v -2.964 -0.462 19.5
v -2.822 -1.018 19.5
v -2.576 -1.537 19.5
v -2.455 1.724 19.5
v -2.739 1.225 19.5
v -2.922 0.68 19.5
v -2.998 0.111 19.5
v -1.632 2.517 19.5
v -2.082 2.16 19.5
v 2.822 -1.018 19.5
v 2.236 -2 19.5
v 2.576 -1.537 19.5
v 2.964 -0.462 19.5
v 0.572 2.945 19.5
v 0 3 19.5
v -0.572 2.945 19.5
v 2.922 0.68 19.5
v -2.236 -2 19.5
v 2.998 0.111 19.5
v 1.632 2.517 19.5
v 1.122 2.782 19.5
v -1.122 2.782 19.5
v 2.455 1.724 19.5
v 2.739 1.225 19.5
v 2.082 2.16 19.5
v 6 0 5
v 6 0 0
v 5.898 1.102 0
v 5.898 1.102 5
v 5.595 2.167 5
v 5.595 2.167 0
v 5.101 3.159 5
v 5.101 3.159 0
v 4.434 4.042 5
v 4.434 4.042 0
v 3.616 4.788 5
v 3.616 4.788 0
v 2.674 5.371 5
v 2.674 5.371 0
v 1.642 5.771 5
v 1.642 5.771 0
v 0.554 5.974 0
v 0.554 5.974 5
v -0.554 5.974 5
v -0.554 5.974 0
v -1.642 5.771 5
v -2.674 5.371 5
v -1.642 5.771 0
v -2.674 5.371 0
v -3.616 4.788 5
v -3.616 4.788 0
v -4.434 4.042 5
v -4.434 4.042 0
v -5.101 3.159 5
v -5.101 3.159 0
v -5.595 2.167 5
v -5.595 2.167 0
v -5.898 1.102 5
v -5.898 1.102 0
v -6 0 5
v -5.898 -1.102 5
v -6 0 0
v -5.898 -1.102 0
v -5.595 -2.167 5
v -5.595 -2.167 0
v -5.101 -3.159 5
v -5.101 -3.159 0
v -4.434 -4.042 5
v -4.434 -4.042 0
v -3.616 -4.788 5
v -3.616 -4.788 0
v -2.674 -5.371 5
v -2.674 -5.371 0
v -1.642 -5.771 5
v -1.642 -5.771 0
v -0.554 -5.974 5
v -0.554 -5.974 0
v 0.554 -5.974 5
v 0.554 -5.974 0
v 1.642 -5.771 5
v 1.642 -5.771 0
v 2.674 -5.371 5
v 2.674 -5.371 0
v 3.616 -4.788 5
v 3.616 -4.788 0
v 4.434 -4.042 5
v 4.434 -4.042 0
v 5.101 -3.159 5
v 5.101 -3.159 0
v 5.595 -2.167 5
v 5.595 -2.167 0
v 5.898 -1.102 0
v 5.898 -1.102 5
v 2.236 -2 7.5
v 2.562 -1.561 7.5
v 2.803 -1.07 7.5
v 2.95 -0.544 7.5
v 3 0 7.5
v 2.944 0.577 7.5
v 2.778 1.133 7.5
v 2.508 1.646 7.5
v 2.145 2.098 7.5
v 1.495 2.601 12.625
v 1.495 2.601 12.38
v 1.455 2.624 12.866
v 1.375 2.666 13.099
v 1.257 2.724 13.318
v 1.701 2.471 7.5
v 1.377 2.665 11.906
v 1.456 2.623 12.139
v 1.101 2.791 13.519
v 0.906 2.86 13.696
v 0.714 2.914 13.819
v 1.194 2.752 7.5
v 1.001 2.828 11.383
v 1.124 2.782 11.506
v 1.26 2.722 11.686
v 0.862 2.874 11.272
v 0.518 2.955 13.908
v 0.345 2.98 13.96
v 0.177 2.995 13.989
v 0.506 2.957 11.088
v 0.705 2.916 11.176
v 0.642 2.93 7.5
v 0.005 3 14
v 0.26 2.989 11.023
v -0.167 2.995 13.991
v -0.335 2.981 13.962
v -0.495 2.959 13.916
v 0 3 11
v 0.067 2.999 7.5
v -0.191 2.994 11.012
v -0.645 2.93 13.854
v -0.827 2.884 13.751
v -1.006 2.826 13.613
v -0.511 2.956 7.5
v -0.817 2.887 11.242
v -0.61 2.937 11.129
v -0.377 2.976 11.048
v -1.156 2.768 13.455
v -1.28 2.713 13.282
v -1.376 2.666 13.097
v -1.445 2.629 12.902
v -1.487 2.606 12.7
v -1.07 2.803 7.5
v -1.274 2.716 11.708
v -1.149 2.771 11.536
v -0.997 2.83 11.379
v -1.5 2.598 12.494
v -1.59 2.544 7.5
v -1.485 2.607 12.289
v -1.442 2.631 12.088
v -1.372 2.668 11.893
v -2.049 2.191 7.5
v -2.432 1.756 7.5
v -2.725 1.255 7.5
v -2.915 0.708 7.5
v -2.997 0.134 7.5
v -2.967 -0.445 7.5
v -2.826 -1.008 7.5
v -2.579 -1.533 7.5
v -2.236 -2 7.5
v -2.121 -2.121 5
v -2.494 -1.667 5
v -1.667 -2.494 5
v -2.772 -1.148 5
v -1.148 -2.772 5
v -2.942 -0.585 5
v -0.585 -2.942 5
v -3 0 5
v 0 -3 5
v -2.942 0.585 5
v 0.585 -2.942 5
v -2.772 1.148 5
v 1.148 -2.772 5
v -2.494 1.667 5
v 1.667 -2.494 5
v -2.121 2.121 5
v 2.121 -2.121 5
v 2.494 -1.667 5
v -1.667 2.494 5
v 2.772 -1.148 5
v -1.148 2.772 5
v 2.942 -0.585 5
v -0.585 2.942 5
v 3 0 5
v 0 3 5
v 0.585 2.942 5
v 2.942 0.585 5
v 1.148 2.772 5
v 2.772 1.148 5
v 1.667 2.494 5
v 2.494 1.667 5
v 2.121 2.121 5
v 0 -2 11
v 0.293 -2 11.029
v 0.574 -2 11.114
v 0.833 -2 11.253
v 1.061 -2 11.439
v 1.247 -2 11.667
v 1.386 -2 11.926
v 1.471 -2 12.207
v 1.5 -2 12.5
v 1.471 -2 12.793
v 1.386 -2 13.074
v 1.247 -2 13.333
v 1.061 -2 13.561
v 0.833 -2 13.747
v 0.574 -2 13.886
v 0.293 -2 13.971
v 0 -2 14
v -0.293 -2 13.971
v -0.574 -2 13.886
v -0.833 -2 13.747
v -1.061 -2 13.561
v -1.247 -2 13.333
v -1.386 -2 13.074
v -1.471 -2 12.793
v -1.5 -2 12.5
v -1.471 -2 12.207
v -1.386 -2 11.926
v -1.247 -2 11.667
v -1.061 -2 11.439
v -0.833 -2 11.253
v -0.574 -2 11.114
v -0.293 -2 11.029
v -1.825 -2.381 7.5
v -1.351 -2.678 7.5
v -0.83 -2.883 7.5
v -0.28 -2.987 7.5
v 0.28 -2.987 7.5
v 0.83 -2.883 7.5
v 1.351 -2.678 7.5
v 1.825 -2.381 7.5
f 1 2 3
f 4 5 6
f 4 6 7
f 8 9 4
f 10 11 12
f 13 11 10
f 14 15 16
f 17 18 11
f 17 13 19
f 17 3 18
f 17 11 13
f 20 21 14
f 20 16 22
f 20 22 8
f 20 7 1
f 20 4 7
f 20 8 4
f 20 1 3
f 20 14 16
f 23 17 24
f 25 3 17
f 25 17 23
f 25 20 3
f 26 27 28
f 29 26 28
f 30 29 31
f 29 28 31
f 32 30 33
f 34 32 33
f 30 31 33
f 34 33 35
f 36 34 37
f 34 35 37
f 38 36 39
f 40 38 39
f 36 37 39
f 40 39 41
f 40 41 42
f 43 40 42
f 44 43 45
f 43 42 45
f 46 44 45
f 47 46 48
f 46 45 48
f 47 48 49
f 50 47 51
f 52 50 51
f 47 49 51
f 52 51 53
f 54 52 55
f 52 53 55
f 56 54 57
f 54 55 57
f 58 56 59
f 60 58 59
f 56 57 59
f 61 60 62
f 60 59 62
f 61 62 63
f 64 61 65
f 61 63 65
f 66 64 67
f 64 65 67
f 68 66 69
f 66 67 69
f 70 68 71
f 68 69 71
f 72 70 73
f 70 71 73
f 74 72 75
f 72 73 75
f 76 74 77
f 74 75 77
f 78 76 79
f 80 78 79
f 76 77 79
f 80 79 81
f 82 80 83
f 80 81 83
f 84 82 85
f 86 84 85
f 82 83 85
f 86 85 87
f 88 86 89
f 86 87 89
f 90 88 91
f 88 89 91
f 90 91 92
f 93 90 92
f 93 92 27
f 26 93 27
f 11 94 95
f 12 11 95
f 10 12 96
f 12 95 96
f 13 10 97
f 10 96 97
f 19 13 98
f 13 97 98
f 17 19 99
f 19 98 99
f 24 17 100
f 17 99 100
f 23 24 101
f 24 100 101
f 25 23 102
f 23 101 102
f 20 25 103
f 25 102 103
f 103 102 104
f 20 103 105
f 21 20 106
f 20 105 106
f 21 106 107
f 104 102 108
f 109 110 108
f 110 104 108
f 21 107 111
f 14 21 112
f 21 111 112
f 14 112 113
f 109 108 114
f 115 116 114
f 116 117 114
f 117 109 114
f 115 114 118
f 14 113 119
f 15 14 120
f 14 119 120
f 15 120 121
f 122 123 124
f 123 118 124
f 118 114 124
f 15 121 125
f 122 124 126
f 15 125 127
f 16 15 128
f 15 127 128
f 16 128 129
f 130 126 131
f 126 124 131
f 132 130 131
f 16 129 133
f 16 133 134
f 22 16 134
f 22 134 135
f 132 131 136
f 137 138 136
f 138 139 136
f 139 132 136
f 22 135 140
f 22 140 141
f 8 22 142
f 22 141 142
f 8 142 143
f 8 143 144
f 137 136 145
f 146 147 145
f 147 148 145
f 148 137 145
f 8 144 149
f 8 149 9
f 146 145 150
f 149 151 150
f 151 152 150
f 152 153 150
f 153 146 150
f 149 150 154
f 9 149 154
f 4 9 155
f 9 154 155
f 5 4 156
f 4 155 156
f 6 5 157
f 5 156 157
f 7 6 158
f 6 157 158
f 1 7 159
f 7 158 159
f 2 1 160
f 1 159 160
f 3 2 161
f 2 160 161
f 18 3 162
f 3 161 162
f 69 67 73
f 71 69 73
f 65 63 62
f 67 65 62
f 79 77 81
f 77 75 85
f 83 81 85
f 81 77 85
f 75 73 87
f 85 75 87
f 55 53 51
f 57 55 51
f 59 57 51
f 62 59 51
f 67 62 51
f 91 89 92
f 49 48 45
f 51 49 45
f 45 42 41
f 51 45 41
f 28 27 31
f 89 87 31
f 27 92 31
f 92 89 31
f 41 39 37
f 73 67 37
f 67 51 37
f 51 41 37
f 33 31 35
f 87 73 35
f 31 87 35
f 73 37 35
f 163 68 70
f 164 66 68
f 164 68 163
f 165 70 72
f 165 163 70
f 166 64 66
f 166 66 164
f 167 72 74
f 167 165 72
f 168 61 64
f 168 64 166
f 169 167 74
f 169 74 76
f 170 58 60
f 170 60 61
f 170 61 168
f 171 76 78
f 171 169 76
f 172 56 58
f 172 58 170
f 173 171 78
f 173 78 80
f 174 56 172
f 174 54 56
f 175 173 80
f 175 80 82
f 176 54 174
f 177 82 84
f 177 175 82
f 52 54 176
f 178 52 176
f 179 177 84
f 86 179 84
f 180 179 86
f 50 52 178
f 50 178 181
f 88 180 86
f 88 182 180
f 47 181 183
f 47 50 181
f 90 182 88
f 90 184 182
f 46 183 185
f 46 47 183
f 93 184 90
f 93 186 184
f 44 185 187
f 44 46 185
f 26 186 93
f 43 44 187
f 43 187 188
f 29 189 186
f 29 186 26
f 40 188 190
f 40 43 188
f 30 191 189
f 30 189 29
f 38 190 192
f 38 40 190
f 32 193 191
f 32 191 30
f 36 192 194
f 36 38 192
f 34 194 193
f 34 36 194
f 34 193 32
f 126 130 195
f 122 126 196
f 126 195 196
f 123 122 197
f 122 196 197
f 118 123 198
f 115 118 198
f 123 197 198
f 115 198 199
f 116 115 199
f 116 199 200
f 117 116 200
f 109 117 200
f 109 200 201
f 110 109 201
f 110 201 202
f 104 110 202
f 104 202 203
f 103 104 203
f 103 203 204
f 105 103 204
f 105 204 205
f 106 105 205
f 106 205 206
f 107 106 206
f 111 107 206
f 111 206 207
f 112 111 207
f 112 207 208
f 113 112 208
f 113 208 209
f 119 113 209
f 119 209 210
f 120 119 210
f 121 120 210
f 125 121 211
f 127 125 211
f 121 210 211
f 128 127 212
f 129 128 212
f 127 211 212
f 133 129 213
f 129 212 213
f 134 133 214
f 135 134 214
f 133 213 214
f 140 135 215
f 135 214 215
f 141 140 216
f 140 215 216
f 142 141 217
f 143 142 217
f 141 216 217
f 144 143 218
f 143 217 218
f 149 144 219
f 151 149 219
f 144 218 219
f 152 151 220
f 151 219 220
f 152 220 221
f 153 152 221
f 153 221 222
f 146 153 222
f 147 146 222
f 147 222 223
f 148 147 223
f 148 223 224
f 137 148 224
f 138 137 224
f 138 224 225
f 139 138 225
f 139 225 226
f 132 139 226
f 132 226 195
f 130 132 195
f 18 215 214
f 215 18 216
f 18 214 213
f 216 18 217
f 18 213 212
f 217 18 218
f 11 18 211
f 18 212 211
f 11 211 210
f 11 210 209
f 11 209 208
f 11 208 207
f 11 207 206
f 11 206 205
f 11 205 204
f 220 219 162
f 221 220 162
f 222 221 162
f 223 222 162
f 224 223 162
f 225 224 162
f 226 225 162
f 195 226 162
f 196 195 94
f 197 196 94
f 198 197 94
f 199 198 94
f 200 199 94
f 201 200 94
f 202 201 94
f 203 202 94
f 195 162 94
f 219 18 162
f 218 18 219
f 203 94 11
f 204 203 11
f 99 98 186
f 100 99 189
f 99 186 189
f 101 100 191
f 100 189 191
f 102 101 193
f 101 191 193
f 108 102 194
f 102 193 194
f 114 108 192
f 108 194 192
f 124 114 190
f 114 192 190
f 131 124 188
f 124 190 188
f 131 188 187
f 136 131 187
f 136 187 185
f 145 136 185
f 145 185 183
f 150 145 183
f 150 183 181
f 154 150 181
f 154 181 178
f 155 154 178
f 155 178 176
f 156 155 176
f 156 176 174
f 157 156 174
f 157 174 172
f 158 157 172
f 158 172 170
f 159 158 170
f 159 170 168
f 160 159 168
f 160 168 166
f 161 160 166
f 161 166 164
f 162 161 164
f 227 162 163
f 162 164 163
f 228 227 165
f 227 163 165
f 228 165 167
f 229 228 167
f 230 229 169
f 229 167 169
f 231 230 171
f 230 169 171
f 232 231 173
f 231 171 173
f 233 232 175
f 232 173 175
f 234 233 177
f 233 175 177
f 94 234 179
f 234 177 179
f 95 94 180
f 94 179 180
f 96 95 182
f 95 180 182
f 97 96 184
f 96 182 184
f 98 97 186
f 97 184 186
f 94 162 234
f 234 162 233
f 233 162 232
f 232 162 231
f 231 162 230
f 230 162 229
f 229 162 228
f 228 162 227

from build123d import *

# Parameters (mm, degrees)
SKETCH1_R               = 6
BOSS_EXTRUDE1_DEPTH     = 5
SKETCH2_R               = 3
BOSS_EXTRUDE2_DEPTH     = 2.5
BOSS_EXTRUDE3_DEPTH     = 12
CUT_EXTRUDE1_REACH      = 23.915
CUT_EXTRUDE1_END_RADIUS = 3
SKETCH4_R               = 1.5


with BuildPart() as part:
    # Sketch1 → Boss-Extrude1 (new body)
    with BuildSketch(Plane.XY):
        Circle(SKETCH1_R)
    extrude(amount=BOSS_EXTRUDE1_DEPTH)

    # Sketch2 → Boss-Extrude2 (add)
    with BuildSketch(Plane.XY.offset(5)):
        Circle(SKETCH2_R)
    extrude(amount=BOSS_EXTRUDE2_DEPTH)

    # Sketch3 → Boss-Extrude3 (add)
    with BuildSketch(Plane.XY.offset(7.5)):
        with BuildLine():
            Line((-2.236067977, -2), (2.236067977, -2))
            ThreePointArc((2.236067977, -2), (0, 3), (-2.236067977, -2))
        make_face()
    extrude(amount=BOSS_EXTRUDE3_DEPTH)

    # Cut-Extrude1: up to this cylinder (the profile starts inside it)
    cut_extrude1_end = Plane(origin=(0, 0, 12.5), z_dir=(0, 0, -1)) * Cylinder(CUT_EXTRUDE1_END_RADIUS, 54.83, mode=Mode.PRIVATE)
    # Sketch4 → Cut-Extrude1 (cut, up to the surface)
    with BuildSketch(Plane.XZ.offset(2), mode=Mode.PRIVATE) as cut_extrude1_sk1:
        with Locations(Location((0, 12.5, 0), (0, 0, 270))):
            Circle(SKETCH4_R)
    cut_extrude1_tool1 = extrude(cut_extrude1_sk1.sketch, amount=-CUT_EXTRUDE1_REACH, mode=Mode.PRIVATE) & cut_extrude1_end
    add(cut_extrude1_tool1.solids().sort_by_distance((0, -2, 12.5))[0], mode=Mode.SUBTRACT)


solid = part.part
